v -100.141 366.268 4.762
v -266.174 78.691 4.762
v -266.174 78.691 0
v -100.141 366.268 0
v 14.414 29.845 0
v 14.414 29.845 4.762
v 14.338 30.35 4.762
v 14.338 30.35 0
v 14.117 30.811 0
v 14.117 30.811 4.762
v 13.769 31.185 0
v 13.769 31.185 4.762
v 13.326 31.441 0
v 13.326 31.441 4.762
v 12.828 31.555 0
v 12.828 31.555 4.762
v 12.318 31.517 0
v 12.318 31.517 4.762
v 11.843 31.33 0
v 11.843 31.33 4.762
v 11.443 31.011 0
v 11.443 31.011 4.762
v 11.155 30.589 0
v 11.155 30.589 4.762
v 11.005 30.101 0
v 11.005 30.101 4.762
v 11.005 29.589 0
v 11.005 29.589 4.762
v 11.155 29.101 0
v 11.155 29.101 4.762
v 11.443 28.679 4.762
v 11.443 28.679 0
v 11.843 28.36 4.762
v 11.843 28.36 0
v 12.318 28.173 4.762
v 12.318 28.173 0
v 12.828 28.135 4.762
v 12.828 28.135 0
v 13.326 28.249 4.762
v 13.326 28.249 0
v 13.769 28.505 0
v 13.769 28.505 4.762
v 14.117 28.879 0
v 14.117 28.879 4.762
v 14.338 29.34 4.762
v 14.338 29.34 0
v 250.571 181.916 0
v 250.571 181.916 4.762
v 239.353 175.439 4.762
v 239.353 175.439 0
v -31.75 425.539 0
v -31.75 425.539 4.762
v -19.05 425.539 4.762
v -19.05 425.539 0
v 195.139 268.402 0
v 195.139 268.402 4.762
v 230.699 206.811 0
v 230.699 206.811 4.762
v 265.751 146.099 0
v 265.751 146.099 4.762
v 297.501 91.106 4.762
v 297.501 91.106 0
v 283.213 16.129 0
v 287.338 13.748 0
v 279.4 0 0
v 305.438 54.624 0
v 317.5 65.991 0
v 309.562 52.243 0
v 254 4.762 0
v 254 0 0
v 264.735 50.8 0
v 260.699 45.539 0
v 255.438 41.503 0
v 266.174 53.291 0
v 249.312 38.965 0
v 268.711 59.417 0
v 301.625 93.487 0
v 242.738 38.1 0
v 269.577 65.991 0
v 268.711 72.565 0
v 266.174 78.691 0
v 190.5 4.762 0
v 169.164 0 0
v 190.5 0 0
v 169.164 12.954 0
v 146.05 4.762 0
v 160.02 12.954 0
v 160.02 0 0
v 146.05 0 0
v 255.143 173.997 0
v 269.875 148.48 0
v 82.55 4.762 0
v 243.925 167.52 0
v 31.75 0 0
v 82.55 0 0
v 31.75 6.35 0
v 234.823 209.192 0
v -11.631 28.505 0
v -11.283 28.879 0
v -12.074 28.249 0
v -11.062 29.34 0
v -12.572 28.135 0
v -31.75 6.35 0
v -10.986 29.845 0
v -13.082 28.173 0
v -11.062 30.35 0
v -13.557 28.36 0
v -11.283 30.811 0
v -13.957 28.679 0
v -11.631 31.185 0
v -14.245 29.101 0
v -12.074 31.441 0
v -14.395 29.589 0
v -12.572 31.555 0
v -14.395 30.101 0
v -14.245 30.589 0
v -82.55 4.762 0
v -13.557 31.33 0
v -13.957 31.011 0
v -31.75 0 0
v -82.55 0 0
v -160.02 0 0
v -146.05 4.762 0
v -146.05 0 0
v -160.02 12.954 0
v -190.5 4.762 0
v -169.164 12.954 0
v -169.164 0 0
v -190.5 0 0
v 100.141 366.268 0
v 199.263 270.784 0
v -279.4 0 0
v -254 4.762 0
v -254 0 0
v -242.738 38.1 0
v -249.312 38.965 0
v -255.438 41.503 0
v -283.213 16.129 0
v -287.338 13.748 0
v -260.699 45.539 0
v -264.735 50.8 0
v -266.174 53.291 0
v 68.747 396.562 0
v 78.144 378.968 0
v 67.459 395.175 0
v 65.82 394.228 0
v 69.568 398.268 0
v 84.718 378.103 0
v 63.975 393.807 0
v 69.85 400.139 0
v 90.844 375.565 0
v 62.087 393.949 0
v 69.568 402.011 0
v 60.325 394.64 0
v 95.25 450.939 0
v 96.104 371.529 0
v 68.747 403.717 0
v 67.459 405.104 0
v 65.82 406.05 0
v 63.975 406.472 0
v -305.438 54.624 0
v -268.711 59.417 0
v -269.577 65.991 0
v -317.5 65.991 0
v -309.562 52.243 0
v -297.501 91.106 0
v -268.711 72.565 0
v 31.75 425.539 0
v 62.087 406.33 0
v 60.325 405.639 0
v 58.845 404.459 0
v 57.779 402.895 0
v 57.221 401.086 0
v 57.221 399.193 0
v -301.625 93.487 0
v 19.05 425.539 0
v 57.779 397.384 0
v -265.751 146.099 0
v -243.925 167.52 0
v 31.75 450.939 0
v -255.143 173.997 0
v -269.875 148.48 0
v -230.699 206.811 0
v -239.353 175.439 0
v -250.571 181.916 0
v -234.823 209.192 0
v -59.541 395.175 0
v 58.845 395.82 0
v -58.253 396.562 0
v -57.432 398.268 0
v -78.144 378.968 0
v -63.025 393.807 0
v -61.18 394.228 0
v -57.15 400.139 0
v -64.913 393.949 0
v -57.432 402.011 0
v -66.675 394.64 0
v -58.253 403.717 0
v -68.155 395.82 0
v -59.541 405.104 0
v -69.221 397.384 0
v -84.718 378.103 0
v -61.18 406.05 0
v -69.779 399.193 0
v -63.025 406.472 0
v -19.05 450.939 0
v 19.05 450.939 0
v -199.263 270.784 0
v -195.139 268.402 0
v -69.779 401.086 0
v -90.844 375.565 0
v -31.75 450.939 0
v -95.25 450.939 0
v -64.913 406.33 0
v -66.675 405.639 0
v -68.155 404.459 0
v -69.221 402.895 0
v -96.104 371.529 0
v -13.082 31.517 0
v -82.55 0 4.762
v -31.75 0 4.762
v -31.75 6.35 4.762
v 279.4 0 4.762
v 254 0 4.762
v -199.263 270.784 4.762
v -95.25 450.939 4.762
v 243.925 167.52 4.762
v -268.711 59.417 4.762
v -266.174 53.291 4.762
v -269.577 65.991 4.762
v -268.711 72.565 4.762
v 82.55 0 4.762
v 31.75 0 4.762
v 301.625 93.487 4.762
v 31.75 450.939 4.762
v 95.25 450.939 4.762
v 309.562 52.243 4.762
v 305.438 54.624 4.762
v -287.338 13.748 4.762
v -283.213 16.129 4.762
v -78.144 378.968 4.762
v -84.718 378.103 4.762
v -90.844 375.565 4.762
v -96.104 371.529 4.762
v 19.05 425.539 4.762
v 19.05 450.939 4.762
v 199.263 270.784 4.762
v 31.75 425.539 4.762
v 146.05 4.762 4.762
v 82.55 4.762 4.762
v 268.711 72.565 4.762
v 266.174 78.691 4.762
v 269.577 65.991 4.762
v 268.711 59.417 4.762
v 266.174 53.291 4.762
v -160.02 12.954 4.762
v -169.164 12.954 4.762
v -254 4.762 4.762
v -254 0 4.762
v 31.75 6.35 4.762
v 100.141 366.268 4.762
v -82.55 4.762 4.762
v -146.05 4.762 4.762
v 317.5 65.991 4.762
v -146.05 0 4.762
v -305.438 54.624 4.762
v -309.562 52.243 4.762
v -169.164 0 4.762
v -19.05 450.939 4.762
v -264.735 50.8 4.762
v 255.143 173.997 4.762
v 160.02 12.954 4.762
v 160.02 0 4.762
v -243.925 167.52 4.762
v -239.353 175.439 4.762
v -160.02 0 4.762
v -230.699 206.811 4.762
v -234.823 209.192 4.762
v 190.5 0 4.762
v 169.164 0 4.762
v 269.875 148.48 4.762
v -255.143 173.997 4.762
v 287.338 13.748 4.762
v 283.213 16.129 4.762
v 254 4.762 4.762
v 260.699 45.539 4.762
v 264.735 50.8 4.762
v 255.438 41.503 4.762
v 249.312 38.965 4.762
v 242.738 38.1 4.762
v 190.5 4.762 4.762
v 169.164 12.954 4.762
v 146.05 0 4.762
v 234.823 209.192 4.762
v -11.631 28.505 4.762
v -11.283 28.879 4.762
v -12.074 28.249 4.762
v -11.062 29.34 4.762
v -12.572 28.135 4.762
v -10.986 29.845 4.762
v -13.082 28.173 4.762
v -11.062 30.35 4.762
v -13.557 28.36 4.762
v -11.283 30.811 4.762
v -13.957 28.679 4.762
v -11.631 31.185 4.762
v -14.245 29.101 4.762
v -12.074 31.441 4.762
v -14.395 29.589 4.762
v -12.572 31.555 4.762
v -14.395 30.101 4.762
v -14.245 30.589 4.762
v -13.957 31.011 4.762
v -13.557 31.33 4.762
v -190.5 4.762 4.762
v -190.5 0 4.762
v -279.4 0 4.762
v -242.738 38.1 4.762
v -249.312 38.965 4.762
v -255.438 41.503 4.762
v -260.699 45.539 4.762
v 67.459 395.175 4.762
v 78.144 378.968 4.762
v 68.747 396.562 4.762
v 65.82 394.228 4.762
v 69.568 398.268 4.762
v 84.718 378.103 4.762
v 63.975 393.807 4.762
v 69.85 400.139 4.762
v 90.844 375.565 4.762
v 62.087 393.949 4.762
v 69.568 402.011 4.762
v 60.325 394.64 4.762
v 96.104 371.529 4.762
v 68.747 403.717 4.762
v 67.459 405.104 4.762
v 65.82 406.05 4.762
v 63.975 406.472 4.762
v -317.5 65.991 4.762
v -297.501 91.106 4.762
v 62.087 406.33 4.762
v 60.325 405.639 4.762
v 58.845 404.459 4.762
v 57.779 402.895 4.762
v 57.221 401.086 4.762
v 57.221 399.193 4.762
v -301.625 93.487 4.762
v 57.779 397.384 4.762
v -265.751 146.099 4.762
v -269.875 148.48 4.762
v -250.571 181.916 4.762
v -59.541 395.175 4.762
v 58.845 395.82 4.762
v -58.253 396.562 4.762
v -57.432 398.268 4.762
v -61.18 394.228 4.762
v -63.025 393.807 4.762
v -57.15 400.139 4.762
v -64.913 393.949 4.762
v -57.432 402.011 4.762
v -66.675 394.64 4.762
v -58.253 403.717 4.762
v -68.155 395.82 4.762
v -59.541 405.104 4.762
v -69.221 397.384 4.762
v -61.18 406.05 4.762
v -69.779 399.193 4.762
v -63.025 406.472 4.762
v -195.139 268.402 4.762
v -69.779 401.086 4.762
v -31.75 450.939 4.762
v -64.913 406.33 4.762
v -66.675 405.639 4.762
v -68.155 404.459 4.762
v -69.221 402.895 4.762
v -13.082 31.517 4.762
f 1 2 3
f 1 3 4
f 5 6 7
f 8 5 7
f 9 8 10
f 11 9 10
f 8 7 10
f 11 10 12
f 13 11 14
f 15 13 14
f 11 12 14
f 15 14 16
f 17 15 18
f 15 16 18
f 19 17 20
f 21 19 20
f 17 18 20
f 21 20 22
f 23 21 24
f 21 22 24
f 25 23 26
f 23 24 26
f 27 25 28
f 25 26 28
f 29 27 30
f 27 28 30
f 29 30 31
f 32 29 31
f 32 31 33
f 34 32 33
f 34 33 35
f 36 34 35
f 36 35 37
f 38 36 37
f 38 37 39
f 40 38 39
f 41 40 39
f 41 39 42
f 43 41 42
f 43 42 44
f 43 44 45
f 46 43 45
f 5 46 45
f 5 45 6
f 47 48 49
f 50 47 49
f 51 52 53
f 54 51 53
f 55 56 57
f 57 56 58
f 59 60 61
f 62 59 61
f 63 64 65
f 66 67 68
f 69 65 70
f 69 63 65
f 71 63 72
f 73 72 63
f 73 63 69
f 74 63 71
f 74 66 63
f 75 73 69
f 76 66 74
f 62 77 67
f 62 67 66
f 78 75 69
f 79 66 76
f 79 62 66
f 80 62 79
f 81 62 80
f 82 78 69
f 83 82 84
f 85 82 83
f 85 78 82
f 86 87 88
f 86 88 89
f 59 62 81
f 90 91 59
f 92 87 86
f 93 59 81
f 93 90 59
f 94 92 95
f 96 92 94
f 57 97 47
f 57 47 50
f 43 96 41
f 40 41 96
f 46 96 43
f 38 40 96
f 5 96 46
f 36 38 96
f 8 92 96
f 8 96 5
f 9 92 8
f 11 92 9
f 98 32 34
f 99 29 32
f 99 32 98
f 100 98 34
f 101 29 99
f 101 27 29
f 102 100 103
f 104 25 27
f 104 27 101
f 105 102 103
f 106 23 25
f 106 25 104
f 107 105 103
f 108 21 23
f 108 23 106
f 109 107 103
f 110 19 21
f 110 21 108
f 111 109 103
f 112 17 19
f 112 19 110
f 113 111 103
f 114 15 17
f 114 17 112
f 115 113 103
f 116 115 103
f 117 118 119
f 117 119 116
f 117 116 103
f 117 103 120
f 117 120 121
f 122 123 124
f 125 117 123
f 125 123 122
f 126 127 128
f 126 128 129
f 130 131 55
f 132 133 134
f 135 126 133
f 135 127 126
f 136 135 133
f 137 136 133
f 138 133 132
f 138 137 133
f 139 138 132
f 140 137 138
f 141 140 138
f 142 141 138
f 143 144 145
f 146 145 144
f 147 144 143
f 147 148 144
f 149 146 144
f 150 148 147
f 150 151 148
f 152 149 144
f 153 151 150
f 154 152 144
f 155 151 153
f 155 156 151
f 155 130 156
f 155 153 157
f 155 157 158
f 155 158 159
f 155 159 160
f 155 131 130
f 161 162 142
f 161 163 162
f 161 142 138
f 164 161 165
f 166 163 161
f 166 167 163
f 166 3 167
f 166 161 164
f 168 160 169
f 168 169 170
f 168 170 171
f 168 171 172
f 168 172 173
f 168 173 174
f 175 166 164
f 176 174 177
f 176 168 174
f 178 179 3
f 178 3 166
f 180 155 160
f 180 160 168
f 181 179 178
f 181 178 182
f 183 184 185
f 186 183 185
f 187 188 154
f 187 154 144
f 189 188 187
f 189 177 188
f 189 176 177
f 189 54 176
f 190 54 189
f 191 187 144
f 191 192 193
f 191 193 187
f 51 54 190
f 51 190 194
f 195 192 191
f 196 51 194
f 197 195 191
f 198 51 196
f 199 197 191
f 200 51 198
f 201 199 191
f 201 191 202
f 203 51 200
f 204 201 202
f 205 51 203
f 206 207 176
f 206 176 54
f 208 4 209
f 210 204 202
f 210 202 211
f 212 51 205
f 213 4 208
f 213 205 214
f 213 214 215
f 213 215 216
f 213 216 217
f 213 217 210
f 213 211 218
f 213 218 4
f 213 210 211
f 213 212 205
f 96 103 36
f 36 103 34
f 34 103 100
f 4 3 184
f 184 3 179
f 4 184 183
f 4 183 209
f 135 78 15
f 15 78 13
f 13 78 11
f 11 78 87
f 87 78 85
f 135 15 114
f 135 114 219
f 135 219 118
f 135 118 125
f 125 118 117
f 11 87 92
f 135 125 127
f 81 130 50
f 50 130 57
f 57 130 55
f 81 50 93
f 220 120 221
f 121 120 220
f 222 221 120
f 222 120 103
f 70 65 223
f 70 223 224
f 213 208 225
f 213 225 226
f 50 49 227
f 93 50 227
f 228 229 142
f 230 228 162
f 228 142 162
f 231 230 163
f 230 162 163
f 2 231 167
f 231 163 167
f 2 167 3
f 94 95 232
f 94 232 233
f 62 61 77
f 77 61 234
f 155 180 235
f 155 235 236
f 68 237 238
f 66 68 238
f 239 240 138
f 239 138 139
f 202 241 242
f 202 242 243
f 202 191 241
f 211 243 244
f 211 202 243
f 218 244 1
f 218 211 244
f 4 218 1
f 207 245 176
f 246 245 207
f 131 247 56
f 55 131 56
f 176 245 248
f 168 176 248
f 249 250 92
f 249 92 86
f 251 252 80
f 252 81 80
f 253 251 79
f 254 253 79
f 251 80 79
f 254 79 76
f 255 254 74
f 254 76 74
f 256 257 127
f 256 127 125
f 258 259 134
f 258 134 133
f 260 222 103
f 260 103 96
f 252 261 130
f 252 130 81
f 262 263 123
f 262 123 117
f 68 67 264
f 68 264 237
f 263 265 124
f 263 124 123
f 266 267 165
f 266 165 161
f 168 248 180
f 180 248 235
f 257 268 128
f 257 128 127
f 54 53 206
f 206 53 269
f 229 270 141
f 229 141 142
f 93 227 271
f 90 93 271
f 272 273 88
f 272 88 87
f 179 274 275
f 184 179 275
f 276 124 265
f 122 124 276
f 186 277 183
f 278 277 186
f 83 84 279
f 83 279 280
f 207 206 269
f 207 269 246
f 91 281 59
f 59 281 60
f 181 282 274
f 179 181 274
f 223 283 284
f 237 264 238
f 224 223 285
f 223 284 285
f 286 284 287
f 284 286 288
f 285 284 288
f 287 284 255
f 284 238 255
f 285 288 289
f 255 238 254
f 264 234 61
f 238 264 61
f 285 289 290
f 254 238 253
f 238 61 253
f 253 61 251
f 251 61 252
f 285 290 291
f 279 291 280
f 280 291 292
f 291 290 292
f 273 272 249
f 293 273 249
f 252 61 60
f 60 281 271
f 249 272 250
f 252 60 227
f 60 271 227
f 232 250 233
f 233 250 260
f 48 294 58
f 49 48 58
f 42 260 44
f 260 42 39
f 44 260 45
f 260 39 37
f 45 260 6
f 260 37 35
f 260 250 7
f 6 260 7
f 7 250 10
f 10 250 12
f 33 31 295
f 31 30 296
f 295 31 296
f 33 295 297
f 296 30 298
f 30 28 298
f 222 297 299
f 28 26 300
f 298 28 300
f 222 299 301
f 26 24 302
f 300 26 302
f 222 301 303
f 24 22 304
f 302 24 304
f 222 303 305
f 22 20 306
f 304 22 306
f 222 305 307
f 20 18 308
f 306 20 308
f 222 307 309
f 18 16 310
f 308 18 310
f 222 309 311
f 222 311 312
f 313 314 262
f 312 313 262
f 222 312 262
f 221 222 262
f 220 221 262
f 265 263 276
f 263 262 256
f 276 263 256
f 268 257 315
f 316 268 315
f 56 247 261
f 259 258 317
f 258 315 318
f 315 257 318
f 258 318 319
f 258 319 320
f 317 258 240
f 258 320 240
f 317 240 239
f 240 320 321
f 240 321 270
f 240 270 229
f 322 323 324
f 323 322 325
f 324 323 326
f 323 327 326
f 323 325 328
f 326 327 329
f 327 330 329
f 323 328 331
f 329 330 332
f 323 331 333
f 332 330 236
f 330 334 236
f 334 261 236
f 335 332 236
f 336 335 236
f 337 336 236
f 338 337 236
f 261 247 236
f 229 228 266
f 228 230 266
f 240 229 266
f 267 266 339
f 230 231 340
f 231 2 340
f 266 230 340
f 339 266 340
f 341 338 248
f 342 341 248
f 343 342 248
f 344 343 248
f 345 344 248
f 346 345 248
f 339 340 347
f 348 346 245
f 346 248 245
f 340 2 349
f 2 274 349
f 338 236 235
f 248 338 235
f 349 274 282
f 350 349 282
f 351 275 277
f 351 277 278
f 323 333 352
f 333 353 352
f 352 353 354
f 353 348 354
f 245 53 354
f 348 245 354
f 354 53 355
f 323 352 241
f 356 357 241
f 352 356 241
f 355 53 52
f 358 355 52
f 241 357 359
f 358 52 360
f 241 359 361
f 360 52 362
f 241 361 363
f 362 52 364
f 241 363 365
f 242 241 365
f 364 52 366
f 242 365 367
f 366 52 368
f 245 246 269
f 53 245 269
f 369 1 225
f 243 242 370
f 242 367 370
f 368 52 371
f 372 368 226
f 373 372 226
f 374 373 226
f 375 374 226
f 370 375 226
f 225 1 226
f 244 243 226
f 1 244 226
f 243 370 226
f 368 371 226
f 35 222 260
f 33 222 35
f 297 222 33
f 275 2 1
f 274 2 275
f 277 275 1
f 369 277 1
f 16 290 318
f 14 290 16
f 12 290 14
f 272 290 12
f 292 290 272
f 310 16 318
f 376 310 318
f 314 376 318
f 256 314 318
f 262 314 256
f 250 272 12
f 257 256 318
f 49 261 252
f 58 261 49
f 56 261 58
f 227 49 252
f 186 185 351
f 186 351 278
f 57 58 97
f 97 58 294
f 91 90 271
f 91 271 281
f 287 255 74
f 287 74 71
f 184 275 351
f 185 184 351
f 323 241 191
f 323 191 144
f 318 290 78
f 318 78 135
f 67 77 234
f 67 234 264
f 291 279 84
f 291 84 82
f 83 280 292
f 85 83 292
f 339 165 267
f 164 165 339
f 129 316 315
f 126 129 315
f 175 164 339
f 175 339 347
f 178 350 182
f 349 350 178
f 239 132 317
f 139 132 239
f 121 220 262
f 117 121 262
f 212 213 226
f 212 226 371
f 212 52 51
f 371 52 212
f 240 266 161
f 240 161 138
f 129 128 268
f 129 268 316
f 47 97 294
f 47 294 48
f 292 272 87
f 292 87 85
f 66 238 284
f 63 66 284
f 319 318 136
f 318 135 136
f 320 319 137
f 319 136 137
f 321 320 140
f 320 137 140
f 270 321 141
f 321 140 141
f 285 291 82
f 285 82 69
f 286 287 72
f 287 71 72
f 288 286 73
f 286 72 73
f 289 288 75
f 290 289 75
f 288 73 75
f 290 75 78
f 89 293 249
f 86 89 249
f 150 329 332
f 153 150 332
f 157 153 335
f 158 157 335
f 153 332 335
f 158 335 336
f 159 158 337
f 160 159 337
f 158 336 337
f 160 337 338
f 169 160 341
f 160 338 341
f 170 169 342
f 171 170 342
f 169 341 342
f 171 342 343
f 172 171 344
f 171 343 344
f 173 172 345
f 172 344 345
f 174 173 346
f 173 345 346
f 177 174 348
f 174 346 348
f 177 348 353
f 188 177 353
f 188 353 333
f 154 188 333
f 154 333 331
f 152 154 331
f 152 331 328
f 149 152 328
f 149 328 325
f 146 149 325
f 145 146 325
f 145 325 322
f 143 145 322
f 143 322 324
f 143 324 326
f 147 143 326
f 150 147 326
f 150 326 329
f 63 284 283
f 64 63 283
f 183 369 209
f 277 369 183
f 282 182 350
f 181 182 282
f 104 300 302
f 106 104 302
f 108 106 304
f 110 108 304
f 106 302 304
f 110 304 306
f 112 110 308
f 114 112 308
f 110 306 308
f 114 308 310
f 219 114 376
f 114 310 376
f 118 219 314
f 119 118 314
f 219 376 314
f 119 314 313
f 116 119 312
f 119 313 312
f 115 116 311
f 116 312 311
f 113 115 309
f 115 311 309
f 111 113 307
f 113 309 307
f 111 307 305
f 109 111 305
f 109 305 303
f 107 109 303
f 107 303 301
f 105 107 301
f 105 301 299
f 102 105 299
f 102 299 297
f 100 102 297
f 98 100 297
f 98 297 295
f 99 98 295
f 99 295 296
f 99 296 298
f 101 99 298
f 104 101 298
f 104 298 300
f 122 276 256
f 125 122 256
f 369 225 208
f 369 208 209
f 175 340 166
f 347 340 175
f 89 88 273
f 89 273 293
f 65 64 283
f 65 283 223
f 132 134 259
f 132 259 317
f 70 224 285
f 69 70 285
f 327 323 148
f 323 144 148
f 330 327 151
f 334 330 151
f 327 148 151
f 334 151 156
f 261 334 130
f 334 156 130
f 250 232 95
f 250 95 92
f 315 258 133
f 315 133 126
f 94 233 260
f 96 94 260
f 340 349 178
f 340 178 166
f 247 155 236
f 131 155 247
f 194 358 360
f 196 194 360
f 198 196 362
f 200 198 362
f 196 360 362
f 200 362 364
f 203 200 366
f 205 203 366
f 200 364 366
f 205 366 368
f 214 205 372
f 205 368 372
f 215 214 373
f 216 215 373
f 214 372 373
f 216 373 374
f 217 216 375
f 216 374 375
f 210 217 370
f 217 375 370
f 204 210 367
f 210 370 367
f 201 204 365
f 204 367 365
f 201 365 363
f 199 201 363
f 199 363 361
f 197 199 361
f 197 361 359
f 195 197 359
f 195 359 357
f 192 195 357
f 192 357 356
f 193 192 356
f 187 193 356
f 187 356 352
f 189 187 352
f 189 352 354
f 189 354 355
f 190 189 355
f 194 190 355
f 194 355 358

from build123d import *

# Parameters (mm, degrees)
BOSS_EXTRUDE2_DEPTH = 4.7625
CUT_EXTRUDE1_REACH  = 553.521
FILLET1_R           = 25.4
SKETCH3_W           = 63.5
SKETCH3_H           = 4.7625
SKETCH3_H_2         = 6.35
SKETCH3_W_2         = 12.7
SKETCH3_H_3         = 25.4
CUT_EXTRUDE2_DEPTH  = 552.520896165
SKETCH4_W           = 9.144
SKETCH4_H           = 12.954
SKETCH4_R           = 1.7145
SKETCH4_R_2         = 6.35
CUT_EXTRUDE3_DEPTH  = 552.520896165


with BuildPart() as part:
    # Sketch1 → Boss-Extrude2 (new body)
    with BuildSketch(Plane.XY):
        Polygon((-95.25, 450.939427751), (95.25, 450.939427751), (317.5, 65.991135768), (279.4, 0), (-279.4, 0), (-317.5, 65.991135768), align=None)
    extrude(amount=BOSS_EXTRUDE2_DEPTH)

    # Sketch2 → Cut-Extrude1 (cut, up to next)
    with BuildSketch(Plane.XY.offset(4.7625), mode=Mode.PRIVATE) as cut_extrude1_sk1:
        Polygon((-92.808632673, 378.968), (92.808632673, 378.968), (273.505909488, 65.991135768), (257.402954744, 38.1), (-257.402954744, 38.1), (-273.505909488, 65.991135768), align=None)
    cut_extrude1_tool1 = extrude(cut_extrude1_sk1.sketch, amount=-CUT_EXTRUDE1_REACH, mode=Mode.PRIVATE) & part.part
    add(cut_extrude1_tool1.solids().sort_by_distance((0, 180.212896, 4.7625))[0], mode=Mode.SUBTRACT)

    # Fillet1
    fillet1_edges = [part.edges().sort_by_distance(p)[0] for p in [
        (-273.505909488, 65.991135768, 2.38125),
        (-92.808632673, 378.968, 2.38125),
        (92.808632673, 378.968, 2.38125),
        (273.505909488, 65.991135768, 2.38125),
        (257.402954744, 38.1, 2.38125),
        (-257.402954744, 38.1, 2.38125),
    ]]
    fillet(fillet1_edges, radius=FILLET1_R)

    # Sketch3 → Cut-Extrude2 (cut, through all)
    with BuildSketch(Plane.XY.offset(4.7625)):
        with Locations((-222.25, 2.38125)):
            Rectangle(SKETCH3_W, SKETCH3_H)
        with Locations((-114.3, 2.38125)):
            Rectangle(SKETCH3_W, SKETCH3_H)
        with Locations((0, 3.175)):
            Rectangle(SKETCH3_W, SKETCH3_H_2)
        Polygon((-199.263, 270.783627103), (-195.138554014, 268.402377103), (-230.698554014, 206.810650386), (-234.823, 209.191900386), align=None)
        Polygon((-269.875, 148.480055479), (-265.750554014, 146.098805479), (-297.500554014, 91.106192339), (-301.625, 93.487442339), align=None)
        Polygon((-309.5625, 52.242982483), (-305.438054014, 54.624232483), (-283.213054014, 16.129403285), (-287.3375, 13.748153285), align=None)
        Polygon((287.3375, 13.748153285), (309.5625, 52.242982483), (305.438054014, 54.624232483), (283.213054014, 16.129403285), align=None)
        Polygon((301.625, 93.487442339), (269.875, 148.480055479), (265.750554014, 146.098805479), (297.500554014, 91.106192339), align=None)
        Polygon((234.823, 209.191900386), (199.263, 270.783627103), (195.138554014, 268.402377103), (230.698554014, 206.810650386), align=None)
        with Locations((114.3, 2.38125)):
            Rectangle(SKETCH3_W, SKETCH3_H)
        with Locations((222.25, 2.38125)):
            Rectangle(SKETCH3_W, SKETCH3_H)
        with Locations((-25.4, 438.239427751)):
            Rectangle(SKETCH3_W_2, SKETCH3_H_3)
        with Locations((25.4, 438.239427751)):
            Rectangle(SKETCH3_W_2, SKETCH3_H_3)
    extrude(amount=-CUT_EXTRUDE2_DEPTH, mode=Mode.SUBTRACT)

    # Sketch4 → Cut-Extrude3 (cut, through all)
    with BuildSketch(Plane.XY.offset(4.7625)):
        Polygon((-239.352506919, 175.438564268), (-250.571, 181.915564268), (-255.143, 173.996627976), (-243.924506919, 167.519627976), align=None)
        with Locations((-164.592, 6.477)):
            Rectangle(SKETCH4_W, SKETCH4_H)
        with Locations((164.592, 6.477)):
            Rectangle(SKETCH4_W, SKETCH4_H)
        Polygon((250.571, 181.915564268), (239.352506919, 175.438564268), (243.924506919, 167.519627976), (255.143, 173.996627976), align=None)
        with Locations((-12.7, 29.845)):
            Circle(SKETCH4_R)
        with Locations((12.7, 29.845)):
            Circle(SKETCH4_R)
        with Locations((63.5, 400.139427751)):
            Circle(SKETCH4_R_2)
        with Locations((-63.5, 400.139427751)):
            Circle(SKETCH4_R_2)
    extrude(amount=-CUT_EXTRUDE3_DEPTH, mode=Mode.SUBTRACT)


solid = part.part
